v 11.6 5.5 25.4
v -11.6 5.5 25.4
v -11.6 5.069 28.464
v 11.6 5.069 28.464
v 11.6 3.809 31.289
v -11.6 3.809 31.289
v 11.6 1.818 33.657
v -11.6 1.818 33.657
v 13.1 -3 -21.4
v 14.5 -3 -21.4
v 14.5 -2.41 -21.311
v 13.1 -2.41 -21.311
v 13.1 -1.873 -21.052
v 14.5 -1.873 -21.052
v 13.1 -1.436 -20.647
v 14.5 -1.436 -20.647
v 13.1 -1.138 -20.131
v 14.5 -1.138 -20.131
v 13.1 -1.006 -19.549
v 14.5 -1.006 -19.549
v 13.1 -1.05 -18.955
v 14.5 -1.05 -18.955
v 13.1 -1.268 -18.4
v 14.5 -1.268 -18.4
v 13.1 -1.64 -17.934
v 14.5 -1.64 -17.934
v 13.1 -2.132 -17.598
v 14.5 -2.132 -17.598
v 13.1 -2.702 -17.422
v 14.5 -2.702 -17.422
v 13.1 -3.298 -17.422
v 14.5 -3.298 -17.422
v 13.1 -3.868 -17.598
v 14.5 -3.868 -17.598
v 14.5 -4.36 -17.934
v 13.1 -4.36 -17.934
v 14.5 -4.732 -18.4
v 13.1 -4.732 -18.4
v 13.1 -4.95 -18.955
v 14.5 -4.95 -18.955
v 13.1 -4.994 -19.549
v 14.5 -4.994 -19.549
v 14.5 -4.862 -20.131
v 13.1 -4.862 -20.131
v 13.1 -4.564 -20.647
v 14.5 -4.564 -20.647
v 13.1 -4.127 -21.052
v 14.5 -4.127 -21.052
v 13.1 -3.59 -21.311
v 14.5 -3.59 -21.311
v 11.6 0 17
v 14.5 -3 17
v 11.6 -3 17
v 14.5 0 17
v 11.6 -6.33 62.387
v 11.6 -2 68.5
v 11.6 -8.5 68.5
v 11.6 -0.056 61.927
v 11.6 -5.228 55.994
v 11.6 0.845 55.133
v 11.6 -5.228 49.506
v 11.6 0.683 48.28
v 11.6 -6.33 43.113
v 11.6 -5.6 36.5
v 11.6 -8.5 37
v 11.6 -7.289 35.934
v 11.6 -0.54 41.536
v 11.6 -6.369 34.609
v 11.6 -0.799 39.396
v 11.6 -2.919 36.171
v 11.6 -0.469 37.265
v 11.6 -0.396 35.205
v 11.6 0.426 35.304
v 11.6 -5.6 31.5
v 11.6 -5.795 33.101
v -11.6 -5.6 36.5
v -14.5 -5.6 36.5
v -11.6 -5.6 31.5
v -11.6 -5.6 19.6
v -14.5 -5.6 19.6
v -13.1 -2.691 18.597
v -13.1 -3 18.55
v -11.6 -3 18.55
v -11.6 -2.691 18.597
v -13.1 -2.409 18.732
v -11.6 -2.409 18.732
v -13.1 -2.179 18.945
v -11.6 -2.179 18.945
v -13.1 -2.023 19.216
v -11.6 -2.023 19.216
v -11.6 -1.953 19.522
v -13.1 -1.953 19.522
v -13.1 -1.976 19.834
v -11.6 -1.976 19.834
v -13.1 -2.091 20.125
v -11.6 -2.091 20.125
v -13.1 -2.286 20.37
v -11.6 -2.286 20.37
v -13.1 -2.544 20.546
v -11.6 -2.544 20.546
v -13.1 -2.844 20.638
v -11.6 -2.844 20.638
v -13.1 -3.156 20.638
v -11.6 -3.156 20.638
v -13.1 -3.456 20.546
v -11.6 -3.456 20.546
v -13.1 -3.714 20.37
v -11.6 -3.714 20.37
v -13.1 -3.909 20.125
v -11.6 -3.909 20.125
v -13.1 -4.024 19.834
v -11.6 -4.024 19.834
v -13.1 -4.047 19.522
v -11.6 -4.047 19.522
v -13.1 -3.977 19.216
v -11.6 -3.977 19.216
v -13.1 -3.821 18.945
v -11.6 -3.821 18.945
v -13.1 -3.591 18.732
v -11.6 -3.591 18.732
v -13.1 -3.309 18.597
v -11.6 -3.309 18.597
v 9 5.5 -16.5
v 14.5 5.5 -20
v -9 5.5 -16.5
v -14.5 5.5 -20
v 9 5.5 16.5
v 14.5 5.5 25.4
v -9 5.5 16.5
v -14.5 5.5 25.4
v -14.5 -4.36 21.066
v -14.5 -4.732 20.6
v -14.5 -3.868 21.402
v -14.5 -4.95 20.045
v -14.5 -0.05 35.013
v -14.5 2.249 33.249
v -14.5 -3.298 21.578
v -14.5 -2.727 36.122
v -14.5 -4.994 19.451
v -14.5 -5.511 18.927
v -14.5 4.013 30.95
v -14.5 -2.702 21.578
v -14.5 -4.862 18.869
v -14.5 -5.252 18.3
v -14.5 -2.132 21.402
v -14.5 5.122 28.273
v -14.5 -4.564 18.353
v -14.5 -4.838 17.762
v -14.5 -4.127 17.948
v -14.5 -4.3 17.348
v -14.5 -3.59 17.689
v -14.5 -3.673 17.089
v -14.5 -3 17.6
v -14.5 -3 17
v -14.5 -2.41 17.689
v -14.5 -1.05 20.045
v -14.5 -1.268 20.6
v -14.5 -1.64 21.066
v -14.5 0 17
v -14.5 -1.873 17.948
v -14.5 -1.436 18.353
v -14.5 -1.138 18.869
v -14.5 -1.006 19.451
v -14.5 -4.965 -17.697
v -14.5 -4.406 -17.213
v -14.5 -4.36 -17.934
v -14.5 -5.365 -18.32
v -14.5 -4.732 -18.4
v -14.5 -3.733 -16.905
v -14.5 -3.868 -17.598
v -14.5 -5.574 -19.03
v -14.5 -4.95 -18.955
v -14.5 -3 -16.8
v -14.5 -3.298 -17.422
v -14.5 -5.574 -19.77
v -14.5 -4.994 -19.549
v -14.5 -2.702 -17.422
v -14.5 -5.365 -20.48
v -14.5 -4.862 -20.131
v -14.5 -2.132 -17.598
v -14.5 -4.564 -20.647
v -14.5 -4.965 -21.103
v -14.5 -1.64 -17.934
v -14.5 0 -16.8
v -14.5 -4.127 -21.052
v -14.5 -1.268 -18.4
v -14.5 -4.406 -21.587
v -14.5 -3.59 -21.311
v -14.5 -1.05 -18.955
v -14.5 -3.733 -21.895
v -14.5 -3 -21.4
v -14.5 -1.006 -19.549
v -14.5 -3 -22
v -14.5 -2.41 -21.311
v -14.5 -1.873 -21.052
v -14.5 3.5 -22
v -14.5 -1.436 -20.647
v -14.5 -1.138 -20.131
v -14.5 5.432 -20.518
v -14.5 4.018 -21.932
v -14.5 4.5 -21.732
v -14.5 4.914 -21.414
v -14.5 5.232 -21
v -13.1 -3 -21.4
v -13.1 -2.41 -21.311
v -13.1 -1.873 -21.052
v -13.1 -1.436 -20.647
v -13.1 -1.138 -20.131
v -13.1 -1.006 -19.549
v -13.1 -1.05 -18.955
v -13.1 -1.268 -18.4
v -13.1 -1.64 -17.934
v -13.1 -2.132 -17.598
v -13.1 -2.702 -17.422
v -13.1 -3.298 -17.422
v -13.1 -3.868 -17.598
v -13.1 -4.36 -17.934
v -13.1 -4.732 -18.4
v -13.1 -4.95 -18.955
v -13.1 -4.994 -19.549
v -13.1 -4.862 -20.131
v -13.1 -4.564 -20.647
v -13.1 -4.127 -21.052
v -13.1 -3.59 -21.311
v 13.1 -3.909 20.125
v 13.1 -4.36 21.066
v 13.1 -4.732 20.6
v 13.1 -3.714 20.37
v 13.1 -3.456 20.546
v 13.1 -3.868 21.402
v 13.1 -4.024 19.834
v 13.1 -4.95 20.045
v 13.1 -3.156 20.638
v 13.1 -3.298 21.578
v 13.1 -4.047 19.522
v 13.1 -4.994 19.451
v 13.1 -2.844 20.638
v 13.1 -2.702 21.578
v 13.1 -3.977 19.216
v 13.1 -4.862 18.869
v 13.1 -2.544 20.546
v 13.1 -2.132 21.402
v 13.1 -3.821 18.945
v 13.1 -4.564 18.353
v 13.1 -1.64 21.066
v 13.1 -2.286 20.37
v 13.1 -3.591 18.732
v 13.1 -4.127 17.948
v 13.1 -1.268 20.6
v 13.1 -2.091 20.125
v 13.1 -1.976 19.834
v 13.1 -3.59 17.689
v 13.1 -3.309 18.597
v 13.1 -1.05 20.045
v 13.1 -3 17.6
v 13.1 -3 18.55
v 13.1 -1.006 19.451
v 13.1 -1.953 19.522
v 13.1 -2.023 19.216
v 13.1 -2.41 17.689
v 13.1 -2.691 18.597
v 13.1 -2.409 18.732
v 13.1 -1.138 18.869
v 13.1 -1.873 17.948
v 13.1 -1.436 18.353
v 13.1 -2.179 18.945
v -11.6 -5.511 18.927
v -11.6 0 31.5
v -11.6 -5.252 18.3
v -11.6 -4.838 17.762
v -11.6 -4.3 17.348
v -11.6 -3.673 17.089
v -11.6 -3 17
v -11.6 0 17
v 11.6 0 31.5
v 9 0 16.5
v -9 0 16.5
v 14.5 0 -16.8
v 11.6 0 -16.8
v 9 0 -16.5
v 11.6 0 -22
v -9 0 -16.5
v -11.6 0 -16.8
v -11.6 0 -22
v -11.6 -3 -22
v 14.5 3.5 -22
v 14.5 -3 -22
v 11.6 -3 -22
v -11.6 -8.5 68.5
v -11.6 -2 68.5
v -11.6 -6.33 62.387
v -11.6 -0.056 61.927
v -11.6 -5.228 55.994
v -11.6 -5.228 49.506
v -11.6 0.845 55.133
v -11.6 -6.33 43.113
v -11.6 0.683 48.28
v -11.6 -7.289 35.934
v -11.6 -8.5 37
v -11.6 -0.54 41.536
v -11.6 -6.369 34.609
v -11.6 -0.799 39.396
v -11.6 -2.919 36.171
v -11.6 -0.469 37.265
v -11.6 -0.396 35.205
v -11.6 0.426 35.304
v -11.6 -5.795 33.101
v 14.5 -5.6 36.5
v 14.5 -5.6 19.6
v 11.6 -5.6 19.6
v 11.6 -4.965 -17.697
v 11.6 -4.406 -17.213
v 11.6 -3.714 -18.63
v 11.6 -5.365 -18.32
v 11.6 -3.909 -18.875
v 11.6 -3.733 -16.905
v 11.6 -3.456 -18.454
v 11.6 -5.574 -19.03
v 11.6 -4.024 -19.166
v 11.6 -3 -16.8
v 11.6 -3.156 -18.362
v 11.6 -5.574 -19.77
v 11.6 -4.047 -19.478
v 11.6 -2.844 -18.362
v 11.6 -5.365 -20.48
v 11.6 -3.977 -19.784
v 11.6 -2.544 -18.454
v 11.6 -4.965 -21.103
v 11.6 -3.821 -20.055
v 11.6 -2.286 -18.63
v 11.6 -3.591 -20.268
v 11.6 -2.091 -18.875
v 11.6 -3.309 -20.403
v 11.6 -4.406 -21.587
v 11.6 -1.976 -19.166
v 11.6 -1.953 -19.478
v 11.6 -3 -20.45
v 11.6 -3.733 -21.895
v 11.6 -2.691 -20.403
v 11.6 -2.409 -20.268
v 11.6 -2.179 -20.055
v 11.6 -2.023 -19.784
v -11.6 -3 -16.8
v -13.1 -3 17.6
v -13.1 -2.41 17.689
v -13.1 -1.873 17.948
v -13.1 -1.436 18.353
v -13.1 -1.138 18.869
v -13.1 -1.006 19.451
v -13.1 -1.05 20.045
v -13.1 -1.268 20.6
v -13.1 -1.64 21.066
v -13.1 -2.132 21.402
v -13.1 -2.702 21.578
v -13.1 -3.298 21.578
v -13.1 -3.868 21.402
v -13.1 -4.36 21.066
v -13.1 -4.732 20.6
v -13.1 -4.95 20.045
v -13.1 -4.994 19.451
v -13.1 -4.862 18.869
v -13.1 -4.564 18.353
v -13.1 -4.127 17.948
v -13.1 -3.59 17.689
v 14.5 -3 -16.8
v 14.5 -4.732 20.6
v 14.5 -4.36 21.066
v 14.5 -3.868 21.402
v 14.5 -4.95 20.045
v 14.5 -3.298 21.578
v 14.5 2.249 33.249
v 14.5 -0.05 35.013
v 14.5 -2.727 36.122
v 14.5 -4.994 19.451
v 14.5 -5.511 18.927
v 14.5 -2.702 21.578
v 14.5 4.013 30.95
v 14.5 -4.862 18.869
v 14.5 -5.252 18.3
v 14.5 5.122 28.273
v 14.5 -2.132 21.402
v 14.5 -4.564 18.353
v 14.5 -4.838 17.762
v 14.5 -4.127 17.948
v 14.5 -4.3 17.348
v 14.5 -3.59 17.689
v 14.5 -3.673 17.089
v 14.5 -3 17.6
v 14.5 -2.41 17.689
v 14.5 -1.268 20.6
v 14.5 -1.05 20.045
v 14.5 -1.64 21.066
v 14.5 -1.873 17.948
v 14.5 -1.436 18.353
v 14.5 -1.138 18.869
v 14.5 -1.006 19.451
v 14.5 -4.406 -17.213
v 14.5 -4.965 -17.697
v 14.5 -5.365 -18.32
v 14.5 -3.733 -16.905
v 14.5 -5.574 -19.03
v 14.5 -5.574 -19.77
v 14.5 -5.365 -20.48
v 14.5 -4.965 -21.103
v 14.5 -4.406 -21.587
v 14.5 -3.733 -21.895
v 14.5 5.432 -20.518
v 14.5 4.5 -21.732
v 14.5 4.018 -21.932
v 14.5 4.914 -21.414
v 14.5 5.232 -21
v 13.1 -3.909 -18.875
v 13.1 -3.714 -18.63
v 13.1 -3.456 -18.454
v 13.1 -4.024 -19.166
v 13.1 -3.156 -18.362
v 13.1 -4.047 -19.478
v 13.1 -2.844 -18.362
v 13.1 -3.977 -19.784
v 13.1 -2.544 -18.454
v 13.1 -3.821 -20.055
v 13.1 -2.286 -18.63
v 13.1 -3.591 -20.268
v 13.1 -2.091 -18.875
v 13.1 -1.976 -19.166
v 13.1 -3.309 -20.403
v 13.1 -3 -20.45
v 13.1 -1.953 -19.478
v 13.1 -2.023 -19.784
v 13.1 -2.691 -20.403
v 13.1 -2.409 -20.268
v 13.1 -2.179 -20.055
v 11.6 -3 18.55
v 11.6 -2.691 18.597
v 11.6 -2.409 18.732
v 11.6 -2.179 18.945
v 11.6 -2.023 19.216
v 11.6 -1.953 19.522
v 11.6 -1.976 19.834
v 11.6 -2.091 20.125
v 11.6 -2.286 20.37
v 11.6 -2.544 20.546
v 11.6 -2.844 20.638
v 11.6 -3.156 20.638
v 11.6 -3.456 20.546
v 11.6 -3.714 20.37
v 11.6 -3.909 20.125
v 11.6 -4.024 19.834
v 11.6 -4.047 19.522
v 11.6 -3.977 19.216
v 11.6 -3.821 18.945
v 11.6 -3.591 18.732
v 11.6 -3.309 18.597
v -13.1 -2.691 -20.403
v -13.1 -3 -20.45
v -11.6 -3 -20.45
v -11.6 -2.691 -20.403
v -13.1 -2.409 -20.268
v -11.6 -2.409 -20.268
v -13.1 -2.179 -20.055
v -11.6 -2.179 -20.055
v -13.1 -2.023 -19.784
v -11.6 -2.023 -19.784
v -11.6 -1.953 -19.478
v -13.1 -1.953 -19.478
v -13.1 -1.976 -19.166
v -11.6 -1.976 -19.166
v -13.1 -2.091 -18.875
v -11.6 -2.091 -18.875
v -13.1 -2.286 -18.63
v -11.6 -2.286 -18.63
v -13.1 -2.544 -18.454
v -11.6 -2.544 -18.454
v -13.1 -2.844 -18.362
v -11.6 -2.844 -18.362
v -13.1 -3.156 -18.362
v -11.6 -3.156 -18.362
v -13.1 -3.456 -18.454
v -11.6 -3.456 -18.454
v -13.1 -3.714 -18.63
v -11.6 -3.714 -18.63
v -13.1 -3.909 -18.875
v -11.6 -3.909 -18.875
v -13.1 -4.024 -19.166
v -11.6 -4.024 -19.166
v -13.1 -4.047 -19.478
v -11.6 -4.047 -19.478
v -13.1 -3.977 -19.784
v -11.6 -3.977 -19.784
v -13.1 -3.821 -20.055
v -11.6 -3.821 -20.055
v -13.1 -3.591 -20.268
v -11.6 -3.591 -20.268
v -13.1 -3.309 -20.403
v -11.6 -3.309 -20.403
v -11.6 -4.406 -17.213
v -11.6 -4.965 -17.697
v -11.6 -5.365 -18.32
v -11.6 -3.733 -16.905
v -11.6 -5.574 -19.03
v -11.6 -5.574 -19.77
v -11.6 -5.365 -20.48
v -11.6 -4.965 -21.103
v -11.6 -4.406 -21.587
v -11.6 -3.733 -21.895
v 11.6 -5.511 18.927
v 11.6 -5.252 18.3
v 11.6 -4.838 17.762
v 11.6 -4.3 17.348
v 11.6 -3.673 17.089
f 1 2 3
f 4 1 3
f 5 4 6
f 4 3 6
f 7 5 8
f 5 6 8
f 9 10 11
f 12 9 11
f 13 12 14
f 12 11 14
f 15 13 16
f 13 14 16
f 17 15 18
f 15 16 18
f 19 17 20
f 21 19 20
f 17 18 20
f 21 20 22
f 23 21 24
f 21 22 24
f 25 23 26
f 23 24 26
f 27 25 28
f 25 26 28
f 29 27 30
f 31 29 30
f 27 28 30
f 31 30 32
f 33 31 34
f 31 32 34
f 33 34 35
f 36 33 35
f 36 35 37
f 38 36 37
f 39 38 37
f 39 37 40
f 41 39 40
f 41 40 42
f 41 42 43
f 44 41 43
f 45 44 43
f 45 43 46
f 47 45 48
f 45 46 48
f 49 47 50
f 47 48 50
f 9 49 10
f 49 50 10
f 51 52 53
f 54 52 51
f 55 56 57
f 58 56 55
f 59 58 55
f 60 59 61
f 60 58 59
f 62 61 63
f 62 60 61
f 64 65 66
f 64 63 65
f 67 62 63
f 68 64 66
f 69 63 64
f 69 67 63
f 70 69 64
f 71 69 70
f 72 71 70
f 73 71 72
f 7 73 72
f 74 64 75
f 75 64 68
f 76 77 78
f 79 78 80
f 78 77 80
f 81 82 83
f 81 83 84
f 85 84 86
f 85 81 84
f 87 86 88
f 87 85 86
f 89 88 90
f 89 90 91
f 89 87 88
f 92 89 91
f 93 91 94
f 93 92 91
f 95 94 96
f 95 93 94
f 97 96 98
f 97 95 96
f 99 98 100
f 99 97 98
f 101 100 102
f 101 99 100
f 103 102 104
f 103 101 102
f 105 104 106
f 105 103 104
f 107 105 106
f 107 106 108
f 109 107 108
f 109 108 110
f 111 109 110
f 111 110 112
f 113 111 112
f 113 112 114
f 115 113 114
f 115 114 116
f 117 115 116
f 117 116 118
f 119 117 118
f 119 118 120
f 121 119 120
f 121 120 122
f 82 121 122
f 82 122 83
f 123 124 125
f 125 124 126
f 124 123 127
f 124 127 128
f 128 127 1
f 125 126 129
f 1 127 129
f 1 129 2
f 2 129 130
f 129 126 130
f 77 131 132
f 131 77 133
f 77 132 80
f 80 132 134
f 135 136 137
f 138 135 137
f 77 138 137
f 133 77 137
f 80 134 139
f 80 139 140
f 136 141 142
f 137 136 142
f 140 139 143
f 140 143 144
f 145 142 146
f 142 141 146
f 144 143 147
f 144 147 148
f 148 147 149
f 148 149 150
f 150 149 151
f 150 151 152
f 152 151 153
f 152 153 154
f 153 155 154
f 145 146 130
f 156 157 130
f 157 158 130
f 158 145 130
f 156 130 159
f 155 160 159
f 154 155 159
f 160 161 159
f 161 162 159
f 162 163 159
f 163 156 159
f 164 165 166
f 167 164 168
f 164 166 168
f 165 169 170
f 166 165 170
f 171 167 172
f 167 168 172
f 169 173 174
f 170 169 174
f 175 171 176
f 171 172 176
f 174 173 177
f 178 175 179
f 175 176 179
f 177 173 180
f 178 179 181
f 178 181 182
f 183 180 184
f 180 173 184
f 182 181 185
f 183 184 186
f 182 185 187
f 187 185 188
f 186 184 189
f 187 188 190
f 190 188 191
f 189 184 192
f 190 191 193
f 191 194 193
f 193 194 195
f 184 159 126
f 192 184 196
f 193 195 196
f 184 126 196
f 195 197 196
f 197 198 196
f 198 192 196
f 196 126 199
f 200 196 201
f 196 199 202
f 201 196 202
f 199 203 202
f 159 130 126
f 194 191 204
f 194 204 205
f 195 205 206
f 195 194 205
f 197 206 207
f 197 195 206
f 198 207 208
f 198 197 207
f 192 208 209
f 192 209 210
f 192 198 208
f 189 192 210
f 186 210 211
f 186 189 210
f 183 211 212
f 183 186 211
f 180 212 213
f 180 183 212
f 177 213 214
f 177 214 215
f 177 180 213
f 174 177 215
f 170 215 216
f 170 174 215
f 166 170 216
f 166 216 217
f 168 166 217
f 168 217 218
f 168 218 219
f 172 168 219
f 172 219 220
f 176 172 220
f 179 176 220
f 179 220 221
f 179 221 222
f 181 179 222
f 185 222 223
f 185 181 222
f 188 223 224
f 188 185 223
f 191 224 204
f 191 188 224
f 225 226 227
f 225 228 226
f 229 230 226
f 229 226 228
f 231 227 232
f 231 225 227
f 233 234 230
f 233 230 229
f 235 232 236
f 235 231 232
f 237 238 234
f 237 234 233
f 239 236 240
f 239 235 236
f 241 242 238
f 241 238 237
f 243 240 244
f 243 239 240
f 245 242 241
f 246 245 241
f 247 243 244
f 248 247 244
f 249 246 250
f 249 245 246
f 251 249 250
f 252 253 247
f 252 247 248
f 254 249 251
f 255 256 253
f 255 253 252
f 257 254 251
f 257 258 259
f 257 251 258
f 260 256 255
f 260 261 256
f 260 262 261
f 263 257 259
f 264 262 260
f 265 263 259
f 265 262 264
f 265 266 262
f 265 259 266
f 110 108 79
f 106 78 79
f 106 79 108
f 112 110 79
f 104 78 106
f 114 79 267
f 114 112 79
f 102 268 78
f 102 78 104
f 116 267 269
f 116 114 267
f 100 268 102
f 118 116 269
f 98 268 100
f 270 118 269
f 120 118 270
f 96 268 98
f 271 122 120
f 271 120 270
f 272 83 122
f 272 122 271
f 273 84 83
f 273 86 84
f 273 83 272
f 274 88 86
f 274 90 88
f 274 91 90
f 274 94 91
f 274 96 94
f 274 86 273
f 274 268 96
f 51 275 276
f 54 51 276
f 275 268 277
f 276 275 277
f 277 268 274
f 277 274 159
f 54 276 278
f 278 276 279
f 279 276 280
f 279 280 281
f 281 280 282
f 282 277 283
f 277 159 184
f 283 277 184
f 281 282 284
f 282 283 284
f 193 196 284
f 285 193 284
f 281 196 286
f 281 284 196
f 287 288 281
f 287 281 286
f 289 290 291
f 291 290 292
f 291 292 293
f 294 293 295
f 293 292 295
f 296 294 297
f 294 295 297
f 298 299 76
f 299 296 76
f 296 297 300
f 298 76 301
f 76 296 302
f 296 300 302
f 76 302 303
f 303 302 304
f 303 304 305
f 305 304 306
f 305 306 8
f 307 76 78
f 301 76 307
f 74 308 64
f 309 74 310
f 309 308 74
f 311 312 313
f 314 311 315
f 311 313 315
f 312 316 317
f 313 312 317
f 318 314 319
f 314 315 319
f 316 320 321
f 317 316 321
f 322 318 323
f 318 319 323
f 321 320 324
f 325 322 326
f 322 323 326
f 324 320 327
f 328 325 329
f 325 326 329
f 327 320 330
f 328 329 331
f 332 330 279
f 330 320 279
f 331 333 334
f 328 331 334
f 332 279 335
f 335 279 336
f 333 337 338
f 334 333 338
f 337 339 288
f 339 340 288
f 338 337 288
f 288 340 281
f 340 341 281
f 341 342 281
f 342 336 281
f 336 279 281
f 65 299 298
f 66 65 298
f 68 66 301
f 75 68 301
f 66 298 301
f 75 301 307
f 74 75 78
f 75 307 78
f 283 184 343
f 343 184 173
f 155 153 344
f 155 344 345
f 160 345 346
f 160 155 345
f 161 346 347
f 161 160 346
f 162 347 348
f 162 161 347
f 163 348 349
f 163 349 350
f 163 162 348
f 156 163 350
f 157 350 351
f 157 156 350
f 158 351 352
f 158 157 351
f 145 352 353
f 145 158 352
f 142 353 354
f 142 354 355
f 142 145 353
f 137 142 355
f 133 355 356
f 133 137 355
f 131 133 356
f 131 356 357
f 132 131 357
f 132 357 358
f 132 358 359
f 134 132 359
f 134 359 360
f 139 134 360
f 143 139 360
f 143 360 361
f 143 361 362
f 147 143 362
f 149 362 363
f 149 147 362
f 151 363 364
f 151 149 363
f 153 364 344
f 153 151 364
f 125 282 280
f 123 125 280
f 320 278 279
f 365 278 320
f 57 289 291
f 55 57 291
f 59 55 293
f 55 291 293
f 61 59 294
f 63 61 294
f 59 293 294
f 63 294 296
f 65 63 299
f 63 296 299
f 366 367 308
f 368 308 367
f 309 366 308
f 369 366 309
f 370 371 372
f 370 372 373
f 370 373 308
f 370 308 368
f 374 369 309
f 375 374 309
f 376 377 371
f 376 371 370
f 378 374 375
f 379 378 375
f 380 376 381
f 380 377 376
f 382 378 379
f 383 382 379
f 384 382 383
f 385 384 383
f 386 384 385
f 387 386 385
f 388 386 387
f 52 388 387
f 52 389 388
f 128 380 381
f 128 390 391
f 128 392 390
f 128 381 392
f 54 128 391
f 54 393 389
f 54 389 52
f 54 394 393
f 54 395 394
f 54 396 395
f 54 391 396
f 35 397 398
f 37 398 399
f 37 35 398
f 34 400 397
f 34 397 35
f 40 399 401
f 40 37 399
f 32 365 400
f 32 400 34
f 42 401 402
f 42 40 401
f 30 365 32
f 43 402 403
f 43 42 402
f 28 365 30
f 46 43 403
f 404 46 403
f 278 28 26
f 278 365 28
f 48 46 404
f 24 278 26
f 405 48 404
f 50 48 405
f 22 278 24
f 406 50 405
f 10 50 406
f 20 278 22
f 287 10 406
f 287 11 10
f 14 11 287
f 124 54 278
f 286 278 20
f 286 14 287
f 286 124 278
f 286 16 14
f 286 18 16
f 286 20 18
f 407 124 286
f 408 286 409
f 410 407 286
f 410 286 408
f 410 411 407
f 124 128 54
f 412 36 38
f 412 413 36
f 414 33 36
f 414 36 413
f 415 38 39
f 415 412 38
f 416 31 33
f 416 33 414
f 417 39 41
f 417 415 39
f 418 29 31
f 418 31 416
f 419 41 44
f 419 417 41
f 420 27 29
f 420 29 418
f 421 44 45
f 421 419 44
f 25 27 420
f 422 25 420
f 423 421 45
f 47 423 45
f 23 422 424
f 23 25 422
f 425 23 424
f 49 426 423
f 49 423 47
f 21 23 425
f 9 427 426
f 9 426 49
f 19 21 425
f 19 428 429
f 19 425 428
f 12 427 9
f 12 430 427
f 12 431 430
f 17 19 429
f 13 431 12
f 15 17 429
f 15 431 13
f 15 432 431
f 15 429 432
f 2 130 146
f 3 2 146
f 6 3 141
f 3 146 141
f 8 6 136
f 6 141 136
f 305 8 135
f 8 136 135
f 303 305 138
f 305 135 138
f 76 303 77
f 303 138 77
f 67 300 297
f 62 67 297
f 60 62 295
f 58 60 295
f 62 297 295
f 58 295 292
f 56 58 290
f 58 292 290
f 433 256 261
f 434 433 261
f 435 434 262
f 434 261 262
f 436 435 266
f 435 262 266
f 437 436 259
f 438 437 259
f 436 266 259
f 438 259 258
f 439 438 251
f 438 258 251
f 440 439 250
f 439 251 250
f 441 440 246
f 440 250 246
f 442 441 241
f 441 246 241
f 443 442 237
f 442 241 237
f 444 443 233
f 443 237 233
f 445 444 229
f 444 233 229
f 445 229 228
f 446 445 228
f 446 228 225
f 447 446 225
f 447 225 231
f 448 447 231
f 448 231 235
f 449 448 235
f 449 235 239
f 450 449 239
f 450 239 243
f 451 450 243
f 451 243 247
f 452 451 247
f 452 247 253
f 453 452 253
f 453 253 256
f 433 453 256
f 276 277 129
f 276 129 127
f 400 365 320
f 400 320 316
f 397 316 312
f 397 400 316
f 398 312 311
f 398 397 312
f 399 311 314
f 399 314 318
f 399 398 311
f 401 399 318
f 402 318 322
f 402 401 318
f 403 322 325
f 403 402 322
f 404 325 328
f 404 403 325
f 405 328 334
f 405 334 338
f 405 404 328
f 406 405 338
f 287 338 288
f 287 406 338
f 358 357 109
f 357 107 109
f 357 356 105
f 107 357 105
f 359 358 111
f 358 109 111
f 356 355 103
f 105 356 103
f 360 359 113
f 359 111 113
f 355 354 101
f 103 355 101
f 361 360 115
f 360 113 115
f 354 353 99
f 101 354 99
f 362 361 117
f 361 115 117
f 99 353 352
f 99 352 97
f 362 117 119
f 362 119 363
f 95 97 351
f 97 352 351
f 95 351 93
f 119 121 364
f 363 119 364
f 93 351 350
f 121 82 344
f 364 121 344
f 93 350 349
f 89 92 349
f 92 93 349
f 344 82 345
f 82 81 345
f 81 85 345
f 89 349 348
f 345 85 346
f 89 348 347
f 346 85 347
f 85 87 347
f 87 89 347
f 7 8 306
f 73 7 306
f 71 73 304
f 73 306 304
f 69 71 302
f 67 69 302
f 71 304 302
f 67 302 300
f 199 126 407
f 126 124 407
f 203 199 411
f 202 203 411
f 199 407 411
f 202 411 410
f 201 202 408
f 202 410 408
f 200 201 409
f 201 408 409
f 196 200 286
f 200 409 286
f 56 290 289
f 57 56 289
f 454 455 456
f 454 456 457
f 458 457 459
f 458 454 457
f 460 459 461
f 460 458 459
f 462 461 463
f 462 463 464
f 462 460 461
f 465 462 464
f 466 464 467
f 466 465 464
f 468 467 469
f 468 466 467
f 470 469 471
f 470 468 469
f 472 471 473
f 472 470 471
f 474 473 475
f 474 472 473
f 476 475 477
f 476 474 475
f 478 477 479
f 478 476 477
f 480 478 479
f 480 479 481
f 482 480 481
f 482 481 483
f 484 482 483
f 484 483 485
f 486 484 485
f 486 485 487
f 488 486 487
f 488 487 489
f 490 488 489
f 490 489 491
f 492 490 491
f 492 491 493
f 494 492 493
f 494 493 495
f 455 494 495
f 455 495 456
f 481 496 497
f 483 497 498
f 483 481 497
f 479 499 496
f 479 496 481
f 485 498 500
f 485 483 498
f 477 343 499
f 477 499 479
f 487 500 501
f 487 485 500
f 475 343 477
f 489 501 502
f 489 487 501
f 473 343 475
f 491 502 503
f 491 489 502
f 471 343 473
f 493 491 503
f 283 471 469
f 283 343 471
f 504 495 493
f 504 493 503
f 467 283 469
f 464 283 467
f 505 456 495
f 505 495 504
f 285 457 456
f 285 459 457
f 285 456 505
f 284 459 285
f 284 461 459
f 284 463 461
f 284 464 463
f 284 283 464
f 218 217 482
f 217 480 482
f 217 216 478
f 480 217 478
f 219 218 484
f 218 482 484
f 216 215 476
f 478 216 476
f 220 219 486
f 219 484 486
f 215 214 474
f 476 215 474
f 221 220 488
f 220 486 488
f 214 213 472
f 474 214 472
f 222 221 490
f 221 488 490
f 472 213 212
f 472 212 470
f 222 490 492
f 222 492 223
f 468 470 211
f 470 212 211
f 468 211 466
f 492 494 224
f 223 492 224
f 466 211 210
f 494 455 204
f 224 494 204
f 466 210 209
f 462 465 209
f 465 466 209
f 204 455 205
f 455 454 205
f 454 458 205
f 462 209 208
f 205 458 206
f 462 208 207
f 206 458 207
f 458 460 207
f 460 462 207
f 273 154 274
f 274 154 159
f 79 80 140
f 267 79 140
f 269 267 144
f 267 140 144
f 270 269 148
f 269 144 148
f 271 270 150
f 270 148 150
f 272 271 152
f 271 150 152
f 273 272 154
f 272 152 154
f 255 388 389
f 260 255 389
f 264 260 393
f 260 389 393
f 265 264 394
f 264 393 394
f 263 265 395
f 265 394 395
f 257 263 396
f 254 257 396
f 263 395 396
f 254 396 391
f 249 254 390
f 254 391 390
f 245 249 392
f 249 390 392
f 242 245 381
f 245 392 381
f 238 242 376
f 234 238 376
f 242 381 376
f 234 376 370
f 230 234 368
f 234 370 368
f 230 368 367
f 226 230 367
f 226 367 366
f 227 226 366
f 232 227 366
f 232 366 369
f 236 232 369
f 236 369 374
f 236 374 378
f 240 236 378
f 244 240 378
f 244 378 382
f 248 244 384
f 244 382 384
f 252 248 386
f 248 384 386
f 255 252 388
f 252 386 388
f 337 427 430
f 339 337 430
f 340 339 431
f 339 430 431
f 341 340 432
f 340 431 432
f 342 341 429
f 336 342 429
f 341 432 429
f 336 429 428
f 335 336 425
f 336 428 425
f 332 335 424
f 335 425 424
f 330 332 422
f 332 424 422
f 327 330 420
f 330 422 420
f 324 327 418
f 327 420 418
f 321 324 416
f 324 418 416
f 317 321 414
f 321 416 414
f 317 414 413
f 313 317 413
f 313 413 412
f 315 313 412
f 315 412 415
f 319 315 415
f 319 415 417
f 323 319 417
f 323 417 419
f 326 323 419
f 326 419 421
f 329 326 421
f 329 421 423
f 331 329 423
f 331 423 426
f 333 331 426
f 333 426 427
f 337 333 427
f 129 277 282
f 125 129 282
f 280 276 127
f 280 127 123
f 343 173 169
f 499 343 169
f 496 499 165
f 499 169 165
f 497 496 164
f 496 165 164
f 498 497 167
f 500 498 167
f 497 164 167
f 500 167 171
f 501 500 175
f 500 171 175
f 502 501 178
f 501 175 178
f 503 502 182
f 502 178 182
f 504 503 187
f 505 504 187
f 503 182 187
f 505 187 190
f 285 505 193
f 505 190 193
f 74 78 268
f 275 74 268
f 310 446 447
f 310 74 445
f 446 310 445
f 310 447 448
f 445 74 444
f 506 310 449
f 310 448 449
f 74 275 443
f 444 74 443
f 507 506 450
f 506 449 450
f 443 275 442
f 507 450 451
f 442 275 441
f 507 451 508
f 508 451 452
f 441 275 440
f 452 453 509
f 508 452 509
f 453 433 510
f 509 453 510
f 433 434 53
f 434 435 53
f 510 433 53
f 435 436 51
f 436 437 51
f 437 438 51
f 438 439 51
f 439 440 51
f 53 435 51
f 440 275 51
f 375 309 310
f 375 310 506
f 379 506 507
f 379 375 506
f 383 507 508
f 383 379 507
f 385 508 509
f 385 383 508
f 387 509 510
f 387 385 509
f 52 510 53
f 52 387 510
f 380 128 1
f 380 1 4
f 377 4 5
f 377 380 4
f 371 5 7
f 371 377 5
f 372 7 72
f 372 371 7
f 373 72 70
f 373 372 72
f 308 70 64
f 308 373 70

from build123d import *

# Parameters (mm, degrees)
SKETCH1_W                       = 29
SKETCH1_H                       = 44
SKETCH1_W_2                     = 18
SKETCH1_H_2                     = 33
BOSS_EXTRUDE1_DEPTH             = 5.5
SKETCH2_R                       = 1.05
BOSS_EXTRUDE2_DEPTH             = 2.9
SKETCH2_4_R                     = 2
SKETCH2_4_R_2                   = 1.05
CUT_EXTRUDE1_DEPTH              = 1.4
BOSS_EXTRUDE4_REACH             = 41.672
BOSS_EXTRUDE4_DIRECTION_2_REACH = 41.672
FILLET1_R                       = 2


with BuildPart() as part:
    # Sketch1 → Boss-Extrude1 (new body)
    with BuildSketch(Plane(origin=(0, 0, 0), x_dir=(1, 0, 0), z_dir=(0, 1, 0))):
        Rectangle(SKETCH1_W, SKETCH1_H)
        Rectangle(SKETCH1_W_2, SKETCH1_H_2, mode=Mode.SUBTRACT)
    extrude(amount=BOSS_EXTRUDE1_DEPTH)

    # Sketch2 → Boss-Extrude2 (add)
    # profile 1 of 2: a face of its own
    with BuildSketch(Plane(origin=(14.5, 0, 0), x_dir=(0, 0, -1), z_dir=(1, 0, 0))):
        with BuildLine():
            Line((-17, -3), (-17, 0))
            Line((-17, 0), (-22, 0))
            Line((-22, 0), (-22, 5.5))
            Line((-22, 5.5), (-25.4, 5.5))
            ThreePointArc((-25.4, 5.5), (-33.248885271, 2.248885271), (-36.5, -5.6))
            Line((-36.5, -5.6), (-19.6, -5.6))
            ThreePointArc((-19.6, -5.6), (-17.761522369, -4.838477631), (-17, -3))
        make_face()
        with Locations((-19.6, -3)):
            Circle(SKETCH2_R, mode=Mode.SUBTRACT)
    # profile 2 of 2: a face of its own
    with BuildSketch(Plane(origin=(14.5, 0, 0), x_dir=(0, 0, -1), z_dir=(1, 0, 0))):
        with BuildLine():
            Line((22, -3), (22, 0))
            Line((22, 0), (16.8, 0))
            Line((16.8, 0), (16.8, -3))
            ThreePointArc((16.8, -3), (19.4, -5.6), (22, -3))
        make_face()
        with Locations((19.4, -3)):
            Circle(SKETCH2_R, mode=Mode.SUBTRACT)
    boss_extrude2 = extrude(amount=-BOSS_EXTRUDE2_DEPTH)

    # Sketch2<4> → Cut-Extrude1 (cut)
    # profile 1 of 2: a face of its own
    with BuildSketch(Plane(origin=(14.5, 0, 0), x_dir=(0, 0, -1), z_dir=(1, 0, 0))):
        with Locations((19.4, -3)):
            Circle(SKETCH2_4_R)
        with Locations((19.4, -3)):
            Circle(SKETCH2_4_R_2, mode=Mode.SUBTRACT)
    # profile 2 of 2: a face of its own
    with BuildSketch(Plane(origin=(14.5, 0, 0), x_dir=(0, 0, -1), z_dir=(1, 0, 0))):
        with Locations((-19.6, -3)):
            Circle(SKETCH2_4_R)
        with Locations((-19.6, -3)):
            Circle(SKETCH2_4_R_2, mode=Mode.SUBTRACT)
    cut_extrude1 = extrude(amount=-CUT_EXTRUDE1_DEPTH, mode=Mode.SUBTRACT)

    # Mirror1: Boss-Extrude2, Cut-Extrude1 across plane
    add(boss_extrude2.mirror(Plane(origin=(0, 0, 0), x_dir=(0, 0, 1), z_dir=(1, 0, 0))))
    add(cut_extrude1.mirror(Plane(origin=(0, 0, 0), x_dir=(0, 0, 1), z_dir=(1, 0, 0))), mode=Mode.SUBTRACT)

    # Boss-Extrude4: up to this face of the body (flat: up to its plane)
    boss_extrude4_end = Plane(part.part.faces().sort_by_distance((-11.6, -0.943202452, 27.036803337))[0])
    # Sketch3 → Boss-Extrude4 (add, up to the picked face)
    with BuildSketch(Plane(origin=(0, 0, 0), x_dir=(0, 0, -1), z_dir=(1, 0, 0)), mode=Mode.PRIVATE) as boss_extrude4_sk1:
        with BuildLine():
            Line((-31.5, 0), (-22, 0))
            Line((-22, 0), (-22, 5.5))
            Line((-22, 5.5), (-25.4, 5.5))
            ThreePointArc((-25.4, 5.5), (-29.920514853, 4.537797861), (-33.657309154, 1.818008192))
            ThreePointArc((-33.657309154, 1.818008192), (-37.265361906, -0.468563976), (-41.536346157, -0.540330832))
            ThreePointArc((-41.536346157, -0.540330832), (-55.132701751, 0.845458827), (-68.5, -2))
            Line((-68.5, -2), (-68.5, -8.5))
            ThreePointArc((-68.5, -8.5), (-52.75, -5.090094938), (-37, -8.5))
            ThreePointArc((-37, -8.5), (-34.608858311, -6.369406651), (-31.5, -5.6))
            Line((-31.5, -5.6), (-31.5, 0))
        make_face()
    boss_extrude4_tool1 = split(extrude(boss_extrude4_sk1.sketch, amount=-BOSS_EXTRUDE4_REACH, mode=Mode.PRIVATE), bisect_by=boss_extrude4_end, keep=Keep.BOTH, mode=Mode.PRIVATE)
    add(boss_extrude4_tool1.solids().sort_by(Axis((0, -2.060248, 45.404241), (-1, 0, 0)))[0])

    # Boss-Extrude4 direction 2: up to this face of the body (flat: up to its plane)
    boss_extrude4_direction_2_end = Plane(part.part.faces().sort_by_distance((11.6, -0.943202452, 27.036803337))[0])
    # Sketch3 → Boss-Extrude4 direction 2 (add, up to the picked face)
    with BuildSketch(Plane(origin=(0, 0, 0), x_dir=(0, 0, -1), z_dir=(1, 0, 0)), mode=Mode.PRIVATE) as boss_extrude4_direction_2_sk1:
        with BuildLine():
            Line((-31.5, 0), (-22, 0))
            Line((-22, 0), (-22, 5.5))
            Line((-22, 5.5), (-25.4, 5.5))
            ThreePointArc((-25.4, 5.5), (-29.920514853, 4.537797861), (-33.657309154, 1.818008192))
            ThreePointArc((-33.657309154, 1.818008192), (-37.265361906, -0.468563976), (-41.536346157, -0.540330832))
            ThreePointArc((-41.536346157, -0.540330832), (-55.132701751, 0.845458827), (-68.5, -2))
            Line((-68.5, -2), (-68.5, -8.5))
            ThreePointArc((-68.5, -8.5), (-52.75, -5.090094938), (-37, -8.5))
            ThreePointArc((-37, -8.5), (-34.608858311, -6.369406651), (-31.5, -5.6))
            Line((-31.5, -5.6), (-31.5, 0))
        make_face()
    boss_extrude4_direction_2_tool1 = split(extrude(boss_extrude4_direction_2_sk1.sketch, amount=BOSS_EXTRUDE4_DIRECTION_2_REACH, mode=Mode.PRIVATE), bisect_by=boss_extrude4_direction_2_end, keep=Keep.BOTH, mode=Mode.PRIVATE)
    add(boss_extrude4_direction_2_tool1.solids().sort_by(Axis((0, -2.060248, 45.404241), (1, 0, 0)))[0])

    # Fillet1
    fillet1_edges = [part.edges().sort_by_distance(p)[0] for p in [
        (0, 5.5, -22),
    ]]
    fillet(fillet1_edges, radius=FILLET1_R)


solid = part.part
